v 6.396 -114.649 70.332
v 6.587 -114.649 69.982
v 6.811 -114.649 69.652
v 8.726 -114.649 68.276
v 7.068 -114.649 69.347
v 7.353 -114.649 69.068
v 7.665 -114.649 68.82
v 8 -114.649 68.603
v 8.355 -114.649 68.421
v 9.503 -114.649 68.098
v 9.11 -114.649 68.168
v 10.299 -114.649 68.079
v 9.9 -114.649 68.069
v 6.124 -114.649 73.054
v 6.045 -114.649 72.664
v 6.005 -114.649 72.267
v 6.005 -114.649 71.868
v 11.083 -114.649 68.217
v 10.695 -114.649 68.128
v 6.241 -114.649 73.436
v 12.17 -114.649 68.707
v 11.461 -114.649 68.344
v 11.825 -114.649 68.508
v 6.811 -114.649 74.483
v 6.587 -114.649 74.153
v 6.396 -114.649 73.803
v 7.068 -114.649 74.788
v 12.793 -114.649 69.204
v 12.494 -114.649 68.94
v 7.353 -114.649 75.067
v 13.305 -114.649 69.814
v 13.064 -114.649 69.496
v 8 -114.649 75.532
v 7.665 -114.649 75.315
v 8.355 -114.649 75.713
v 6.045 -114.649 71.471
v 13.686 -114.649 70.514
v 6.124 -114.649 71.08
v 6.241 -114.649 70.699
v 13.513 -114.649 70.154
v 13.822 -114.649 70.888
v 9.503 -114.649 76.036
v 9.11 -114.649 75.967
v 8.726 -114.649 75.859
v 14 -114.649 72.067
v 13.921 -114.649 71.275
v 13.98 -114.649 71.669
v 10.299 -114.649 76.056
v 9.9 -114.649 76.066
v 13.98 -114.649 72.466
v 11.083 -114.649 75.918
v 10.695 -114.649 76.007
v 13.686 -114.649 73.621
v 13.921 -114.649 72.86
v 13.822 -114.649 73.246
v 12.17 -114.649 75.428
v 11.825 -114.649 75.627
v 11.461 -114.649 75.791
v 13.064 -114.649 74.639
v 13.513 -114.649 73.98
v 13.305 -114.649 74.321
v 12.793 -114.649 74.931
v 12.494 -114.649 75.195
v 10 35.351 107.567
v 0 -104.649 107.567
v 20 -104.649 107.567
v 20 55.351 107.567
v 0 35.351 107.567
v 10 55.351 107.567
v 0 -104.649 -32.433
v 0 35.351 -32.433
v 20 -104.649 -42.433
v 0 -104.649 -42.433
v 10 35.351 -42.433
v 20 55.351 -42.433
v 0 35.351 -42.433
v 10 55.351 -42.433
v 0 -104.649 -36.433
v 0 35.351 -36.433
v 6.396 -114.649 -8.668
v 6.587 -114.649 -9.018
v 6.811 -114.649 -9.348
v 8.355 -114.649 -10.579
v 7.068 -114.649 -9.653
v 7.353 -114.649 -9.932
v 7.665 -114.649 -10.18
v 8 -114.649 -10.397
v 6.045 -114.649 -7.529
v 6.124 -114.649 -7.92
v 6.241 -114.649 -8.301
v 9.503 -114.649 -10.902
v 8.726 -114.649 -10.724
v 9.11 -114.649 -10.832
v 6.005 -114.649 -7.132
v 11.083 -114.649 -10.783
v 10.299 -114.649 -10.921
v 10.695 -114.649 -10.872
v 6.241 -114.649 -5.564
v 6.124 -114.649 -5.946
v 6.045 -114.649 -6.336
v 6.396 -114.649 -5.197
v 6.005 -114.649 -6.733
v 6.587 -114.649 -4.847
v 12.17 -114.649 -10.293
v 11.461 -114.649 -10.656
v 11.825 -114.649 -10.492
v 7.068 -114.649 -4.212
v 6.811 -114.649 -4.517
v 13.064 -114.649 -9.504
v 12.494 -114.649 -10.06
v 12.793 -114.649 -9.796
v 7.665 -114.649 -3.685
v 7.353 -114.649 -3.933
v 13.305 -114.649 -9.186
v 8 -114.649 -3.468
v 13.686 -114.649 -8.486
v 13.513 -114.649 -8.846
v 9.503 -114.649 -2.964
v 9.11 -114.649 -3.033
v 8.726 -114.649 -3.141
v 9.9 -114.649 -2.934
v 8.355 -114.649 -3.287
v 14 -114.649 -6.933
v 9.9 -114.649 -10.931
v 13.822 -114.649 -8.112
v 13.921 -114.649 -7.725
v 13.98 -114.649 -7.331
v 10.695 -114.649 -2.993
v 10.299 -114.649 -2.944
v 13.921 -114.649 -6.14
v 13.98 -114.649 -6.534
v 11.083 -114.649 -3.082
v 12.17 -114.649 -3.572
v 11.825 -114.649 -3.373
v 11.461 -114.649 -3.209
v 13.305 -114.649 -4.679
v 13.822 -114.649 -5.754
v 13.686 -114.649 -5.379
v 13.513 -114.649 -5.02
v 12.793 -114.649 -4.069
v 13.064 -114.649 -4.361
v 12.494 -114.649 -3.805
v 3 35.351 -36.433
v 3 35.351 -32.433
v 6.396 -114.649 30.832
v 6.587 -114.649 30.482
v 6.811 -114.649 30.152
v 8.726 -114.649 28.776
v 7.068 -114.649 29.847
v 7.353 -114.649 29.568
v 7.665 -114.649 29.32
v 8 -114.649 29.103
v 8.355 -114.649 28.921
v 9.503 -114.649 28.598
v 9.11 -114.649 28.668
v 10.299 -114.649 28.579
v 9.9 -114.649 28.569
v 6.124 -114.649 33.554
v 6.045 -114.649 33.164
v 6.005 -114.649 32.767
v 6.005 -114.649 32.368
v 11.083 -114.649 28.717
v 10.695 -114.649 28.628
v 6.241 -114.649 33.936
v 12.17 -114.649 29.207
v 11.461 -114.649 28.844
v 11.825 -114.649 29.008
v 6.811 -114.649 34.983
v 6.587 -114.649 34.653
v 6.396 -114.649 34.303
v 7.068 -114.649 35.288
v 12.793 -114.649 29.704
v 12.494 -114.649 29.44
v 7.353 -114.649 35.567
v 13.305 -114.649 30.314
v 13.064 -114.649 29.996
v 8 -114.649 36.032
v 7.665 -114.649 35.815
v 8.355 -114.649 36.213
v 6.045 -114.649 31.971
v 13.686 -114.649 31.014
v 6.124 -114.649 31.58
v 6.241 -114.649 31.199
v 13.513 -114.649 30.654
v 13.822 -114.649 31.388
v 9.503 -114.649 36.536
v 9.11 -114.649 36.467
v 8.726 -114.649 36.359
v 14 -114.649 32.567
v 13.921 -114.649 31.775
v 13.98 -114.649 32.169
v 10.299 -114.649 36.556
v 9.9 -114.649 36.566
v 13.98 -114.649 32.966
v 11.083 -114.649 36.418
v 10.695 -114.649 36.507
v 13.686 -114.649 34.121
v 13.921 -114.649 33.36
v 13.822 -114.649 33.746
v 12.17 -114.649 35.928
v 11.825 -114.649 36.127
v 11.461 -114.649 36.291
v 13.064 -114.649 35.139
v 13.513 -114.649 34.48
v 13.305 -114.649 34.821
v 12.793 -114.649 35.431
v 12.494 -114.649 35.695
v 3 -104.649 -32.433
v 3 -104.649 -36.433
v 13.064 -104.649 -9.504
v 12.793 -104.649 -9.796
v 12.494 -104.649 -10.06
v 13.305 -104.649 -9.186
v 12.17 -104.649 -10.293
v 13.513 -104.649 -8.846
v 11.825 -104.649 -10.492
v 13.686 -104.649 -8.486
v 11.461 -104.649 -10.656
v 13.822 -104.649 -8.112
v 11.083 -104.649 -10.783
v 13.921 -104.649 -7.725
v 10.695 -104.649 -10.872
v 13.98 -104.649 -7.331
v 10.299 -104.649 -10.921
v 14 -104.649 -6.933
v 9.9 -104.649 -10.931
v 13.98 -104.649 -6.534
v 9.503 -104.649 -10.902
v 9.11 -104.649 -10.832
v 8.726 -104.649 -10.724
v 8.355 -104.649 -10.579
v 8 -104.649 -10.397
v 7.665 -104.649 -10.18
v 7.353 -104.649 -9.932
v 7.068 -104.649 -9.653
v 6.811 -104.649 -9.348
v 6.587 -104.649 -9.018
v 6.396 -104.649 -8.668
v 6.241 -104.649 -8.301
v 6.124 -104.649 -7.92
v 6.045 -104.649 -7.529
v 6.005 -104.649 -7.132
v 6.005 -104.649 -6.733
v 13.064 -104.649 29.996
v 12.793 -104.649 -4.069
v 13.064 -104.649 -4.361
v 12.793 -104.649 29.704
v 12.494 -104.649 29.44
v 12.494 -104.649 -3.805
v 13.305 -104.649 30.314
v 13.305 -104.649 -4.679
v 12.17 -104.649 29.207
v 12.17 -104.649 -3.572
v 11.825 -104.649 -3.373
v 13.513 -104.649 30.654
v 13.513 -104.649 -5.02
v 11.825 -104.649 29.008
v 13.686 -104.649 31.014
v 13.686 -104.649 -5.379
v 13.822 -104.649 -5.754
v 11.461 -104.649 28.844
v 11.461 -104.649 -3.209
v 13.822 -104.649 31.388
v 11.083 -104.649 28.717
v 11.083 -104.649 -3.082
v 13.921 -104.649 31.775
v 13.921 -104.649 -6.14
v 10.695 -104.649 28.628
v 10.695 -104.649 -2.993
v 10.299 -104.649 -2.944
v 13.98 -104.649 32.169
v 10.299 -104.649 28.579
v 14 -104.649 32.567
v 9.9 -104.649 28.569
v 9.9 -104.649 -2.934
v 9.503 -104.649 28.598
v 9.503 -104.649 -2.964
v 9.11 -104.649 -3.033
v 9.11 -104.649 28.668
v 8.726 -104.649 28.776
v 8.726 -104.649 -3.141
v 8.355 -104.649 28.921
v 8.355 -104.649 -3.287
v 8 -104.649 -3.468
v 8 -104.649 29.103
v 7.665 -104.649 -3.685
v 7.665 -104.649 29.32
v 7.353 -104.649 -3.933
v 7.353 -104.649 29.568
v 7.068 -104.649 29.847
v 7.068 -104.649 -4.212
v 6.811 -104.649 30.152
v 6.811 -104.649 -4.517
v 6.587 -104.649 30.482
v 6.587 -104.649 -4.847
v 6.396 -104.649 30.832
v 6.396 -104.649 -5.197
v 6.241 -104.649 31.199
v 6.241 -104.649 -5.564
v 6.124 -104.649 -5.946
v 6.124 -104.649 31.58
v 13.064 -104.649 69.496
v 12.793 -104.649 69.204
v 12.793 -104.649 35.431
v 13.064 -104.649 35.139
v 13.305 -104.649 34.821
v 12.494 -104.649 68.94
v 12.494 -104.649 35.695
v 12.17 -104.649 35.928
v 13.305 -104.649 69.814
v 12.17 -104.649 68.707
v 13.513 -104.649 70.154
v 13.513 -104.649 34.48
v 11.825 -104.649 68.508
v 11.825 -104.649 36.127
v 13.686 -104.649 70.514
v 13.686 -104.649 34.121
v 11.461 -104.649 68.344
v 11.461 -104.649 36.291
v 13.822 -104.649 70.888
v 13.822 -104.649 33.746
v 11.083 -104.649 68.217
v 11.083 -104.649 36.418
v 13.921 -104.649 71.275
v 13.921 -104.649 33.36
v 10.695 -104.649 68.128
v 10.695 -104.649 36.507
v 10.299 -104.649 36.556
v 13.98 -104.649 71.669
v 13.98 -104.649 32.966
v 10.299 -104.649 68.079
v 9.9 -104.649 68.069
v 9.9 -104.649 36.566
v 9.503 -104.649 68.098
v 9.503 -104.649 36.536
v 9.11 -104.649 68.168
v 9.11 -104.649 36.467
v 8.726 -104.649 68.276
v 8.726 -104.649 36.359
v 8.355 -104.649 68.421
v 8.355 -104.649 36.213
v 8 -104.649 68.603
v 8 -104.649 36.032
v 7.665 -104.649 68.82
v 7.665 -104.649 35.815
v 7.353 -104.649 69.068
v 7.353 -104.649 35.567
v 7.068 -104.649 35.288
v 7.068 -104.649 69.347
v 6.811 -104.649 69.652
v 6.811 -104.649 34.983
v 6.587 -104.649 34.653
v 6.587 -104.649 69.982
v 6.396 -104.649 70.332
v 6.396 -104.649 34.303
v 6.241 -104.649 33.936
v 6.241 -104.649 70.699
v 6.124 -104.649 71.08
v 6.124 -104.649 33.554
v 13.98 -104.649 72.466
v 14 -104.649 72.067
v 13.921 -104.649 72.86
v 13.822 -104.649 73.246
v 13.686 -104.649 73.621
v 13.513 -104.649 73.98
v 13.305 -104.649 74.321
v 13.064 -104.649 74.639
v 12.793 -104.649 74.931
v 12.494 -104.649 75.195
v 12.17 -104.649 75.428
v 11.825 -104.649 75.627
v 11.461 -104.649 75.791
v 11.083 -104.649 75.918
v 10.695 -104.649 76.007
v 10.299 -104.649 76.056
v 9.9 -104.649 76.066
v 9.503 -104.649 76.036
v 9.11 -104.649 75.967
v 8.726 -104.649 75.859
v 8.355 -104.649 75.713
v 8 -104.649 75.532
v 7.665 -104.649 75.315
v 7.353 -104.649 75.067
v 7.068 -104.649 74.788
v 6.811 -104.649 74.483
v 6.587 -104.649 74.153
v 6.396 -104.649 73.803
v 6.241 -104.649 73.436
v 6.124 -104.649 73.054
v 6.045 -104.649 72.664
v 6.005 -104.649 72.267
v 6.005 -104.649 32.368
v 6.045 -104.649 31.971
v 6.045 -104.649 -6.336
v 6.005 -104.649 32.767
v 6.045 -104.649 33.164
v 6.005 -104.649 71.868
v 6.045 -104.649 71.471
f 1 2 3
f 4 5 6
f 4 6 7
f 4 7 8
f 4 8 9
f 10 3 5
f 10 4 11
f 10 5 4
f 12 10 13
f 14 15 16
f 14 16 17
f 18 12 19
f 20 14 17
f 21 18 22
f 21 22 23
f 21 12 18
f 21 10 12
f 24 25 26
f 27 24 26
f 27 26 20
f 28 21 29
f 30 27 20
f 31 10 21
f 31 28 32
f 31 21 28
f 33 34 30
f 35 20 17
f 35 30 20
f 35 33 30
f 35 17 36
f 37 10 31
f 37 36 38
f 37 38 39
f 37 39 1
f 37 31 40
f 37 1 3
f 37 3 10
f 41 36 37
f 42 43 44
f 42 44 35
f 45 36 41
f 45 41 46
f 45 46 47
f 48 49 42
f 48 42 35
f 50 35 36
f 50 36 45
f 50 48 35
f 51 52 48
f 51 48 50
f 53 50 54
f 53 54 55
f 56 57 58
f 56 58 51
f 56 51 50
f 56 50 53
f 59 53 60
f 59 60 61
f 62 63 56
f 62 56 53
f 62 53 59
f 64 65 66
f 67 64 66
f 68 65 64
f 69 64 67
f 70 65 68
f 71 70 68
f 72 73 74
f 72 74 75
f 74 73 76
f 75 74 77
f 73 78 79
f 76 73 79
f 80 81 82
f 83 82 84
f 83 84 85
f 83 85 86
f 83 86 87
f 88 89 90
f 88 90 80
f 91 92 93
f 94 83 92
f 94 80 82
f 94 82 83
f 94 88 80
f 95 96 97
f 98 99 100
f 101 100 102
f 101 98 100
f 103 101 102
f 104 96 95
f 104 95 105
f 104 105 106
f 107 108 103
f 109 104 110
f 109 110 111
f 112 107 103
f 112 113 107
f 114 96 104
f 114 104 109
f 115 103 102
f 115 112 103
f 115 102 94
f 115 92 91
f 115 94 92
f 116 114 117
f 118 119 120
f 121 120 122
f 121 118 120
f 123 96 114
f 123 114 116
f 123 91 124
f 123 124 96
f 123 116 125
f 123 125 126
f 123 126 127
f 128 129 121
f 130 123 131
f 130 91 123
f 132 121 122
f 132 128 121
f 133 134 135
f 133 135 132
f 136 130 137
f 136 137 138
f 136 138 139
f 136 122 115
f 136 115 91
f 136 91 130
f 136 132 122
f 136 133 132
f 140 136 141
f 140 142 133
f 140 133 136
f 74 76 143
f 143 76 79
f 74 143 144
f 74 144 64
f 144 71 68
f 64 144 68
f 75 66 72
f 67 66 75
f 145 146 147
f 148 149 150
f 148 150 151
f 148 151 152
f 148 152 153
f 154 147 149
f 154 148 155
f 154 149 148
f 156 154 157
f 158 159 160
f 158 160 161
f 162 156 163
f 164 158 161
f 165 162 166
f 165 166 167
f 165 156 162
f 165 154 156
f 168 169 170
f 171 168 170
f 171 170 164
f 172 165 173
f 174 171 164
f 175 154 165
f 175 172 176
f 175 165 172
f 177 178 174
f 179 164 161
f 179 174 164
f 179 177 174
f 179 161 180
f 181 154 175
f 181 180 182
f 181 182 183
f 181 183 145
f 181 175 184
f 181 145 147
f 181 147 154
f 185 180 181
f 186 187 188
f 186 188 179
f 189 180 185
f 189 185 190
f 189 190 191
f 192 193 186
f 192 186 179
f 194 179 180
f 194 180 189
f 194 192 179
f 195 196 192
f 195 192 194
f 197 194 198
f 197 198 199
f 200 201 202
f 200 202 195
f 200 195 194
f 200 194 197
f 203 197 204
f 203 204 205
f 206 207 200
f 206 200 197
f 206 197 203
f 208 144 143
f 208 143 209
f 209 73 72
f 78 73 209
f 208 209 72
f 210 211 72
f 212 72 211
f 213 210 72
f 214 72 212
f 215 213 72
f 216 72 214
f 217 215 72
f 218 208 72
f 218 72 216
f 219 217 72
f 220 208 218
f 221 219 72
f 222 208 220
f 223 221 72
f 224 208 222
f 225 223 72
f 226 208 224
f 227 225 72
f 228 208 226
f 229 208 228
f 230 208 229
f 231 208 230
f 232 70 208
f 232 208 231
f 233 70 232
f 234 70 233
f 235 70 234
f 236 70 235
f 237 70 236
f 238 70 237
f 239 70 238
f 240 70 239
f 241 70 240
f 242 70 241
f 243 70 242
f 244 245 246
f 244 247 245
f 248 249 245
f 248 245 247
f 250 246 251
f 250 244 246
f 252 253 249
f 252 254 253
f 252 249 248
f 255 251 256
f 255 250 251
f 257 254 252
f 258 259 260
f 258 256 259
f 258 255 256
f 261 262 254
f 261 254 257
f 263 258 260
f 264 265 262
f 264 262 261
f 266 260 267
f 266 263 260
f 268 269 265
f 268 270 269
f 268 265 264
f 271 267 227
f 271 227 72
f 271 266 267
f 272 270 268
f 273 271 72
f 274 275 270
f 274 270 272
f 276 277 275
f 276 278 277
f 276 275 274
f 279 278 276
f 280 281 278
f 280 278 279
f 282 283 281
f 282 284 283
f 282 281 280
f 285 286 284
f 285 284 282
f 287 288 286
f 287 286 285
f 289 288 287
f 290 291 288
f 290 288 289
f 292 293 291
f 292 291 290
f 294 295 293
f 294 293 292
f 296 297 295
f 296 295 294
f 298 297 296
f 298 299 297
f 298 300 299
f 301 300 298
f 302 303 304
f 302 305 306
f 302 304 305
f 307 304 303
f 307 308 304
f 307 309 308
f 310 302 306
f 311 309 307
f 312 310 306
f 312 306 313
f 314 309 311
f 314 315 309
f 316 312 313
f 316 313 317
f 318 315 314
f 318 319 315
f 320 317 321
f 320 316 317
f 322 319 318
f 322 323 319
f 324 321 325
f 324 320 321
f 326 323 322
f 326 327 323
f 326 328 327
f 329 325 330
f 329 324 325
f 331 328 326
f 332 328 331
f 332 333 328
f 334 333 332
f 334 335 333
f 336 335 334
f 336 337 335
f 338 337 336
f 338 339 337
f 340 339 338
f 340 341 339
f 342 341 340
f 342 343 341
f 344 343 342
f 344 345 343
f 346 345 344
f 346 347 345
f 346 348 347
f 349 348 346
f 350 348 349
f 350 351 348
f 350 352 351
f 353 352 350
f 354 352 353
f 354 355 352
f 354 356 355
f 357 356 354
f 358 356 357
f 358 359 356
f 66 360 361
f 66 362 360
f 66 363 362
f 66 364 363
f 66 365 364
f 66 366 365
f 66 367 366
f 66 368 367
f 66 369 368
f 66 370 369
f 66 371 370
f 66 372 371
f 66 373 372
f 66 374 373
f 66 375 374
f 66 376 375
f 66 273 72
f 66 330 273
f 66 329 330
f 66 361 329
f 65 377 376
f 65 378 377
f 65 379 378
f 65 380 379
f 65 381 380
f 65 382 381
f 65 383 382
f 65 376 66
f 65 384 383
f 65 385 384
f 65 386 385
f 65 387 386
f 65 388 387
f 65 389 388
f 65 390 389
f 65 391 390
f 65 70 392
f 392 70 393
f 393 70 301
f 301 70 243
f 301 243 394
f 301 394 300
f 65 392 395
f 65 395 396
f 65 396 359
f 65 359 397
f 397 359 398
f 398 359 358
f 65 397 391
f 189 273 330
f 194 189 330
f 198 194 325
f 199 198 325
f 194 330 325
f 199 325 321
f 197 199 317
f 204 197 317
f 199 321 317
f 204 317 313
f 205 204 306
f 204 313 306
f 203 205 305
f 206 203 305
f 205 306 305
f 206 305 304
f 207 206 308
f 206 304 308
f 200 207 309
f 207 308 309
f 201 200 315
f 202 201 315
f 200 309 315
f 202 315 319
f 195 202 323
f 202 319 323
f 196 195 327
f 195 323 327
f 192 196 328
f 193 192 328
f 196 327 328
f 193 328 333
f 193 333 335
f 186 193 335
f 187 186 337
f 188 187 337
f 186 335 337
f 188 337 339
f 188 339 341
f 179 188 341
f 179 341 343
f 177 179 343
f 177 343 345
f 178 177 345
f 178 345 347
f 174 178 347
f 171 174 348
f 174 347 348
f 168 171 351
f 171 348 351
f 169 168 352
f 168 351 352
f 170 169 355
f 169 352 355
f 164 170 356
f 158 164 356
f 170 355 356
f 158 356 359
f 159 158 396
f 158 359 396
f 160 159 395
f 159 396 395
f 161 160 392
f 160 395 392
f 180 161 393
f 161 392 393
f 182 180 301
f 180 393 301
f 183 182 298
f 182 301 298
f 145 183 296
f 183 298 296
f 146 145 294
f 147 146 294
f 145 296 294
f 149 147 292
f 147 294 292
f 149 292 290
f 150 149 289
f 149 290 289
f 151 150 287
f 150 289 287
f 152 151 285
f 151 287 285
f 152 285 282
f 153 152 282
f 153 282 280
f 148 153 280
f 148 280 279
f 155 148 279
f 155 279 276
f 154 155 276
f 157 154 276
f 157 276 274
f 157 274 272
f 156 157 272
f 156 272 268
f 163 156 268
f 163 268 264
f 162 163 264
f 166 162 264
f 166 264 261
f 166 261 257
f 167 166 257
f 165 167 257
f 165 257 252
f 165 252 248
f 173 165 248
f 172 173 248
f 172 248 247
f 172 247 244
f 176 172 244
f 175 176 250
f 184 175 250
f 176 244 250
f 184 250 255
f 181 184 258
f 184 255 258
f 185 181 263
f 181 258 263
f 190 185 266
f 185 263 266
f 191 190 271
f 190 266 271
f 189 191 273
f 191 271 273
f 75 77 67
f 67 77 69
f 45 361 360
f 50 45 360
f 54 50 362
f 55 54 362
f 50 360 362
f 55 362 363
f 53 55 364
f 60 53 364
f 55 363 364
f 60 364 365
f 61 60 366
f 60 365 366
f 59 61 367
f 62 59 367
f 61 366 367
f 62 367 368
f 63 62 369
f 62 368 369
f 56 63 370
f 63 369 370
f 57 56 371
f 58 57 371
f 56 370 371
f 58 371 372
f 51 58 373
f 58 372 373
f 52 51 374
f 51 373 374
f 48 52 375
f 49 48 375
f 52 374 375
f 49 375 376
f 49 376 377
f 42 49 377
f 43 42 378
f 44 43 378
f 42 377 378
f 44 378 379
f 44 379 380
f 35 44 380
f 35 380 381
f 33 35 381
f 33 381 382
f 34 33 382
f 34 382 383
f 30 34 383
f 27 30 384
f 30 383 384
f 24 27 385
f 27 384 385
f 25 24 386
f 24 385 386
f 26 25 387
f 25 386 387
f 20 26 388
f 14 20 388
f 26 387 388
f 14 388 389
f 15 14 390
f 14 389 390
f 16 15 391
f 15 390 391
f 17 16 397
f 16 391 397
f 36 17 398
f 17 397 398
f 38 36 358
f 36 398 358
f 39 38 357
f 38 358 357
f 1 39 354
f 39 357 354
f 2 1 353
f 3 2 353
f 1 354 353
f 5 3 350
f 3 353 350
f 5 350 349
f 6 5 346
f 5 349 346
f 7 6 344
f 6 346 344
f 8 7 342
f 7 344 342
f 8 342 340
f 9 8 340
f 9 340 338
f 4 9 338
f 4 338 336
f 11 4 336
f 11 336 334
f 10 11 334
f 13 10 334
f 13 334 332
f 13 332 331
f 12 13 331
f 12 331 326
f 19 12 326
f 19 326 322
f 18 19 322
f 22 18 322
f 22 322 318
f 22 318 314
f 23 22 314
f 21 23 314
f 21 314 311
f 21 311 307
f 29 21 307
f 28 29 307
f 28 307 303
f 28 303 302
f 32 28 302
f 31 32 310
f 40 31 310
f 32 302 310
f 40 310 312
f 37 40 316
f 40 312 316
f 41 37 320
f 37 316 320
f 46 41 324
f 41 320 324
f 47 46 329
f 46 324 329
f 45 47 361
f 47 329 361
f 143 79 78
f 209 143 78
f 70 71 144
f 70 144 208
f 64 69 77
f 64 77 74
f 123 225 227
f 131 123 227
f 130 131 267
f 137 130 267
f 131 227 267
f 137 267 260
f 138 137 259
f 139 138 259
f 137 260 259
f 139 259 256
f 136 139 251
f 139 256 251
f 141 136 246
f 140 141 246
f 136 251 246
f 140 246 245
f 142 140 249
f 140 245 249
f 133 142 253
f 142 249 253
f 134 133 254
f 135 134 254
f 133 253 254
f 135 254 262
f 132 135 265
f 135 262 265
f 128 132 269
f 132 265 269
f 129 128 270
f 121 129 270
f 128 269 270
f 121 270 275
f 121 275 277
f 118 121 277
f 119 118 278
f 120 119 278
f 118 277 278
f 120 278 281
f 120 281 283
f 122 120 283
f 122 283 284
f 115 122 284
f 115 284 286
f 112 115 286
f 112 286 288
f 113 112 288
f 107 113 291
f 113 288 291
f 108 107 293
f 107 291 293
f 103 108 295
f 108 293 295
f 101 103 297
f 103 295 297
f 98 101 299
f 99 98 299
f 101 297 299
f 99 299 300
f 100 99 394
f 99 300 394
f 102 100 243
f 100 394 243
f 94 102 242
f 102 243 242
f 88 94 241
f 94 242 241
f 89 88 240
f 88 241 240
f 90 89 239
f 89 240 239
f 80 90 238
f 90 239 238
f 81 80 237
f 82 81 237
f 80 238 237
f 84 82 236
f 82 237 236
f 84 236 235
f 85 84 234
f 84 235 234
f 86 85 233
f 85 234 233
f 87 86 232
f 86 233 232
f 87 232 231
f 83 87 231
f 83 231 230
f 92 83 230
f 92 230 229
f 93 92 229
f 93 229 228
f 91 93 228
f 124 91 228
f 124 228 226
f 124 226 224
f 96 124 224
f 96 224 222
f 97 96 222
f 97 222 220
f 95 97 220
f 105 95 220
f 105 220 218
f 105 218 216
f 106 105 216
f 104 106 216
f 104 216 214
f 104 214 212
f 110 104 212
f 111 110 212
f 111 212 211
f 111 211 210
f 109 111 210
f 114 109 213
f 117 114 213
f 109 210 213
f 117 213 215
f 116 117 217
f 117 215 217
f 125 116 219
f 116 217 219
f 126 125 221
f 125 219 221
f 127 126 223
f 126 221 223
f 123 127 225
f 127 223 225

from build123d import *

# Parameters (mm, degrees)
F0_W     = 160
F0_H     = 150
F1_DEPTH = 20
F2_W     = 20
F2_H     = 150
F3_DEPTH = 10
F5_W     = 140
F5_H     = 4
F6_DEPTH = 3
F4_R     = 4
F7_DEPTH = 10


with BuildPart() as f1:
    # F0 (on Right) → F1 (new body)
    with BuildSketch(Plane.YZ):
        with Locations((-24.649234, 32.567439)):
            Rectangle(F0_W, F0_H)
    extrude(amount=F1_DEPTH)

    # F2 (on face) → F3 (cut)
    with BuildSketch(Plane(origin=(0, 0, 0), x_dir=(0, -1, 0), z_dir=(-1, 0, 0))):
        with Locations((-45.350766, 32.567439)):
            Rectangle(F2_W, F2_H)
    extrude(amount=-F3_DEPTH, mode=Mode.SUBTRACT)

    # F5 (on face) → F6 (cut)
    with BuildSketch(Plane(origin=(0, 0, 0), x_dir=(0, -1, 0), z_dir=(-1, 0, 0))):
        with Locations((34.649234, -34.432561)):
            Rectangle(F5_W, F5_H)
    extrude(amount=-F6_DEPTH, mode=Mode.SUBTRACT)

    # F4 (on face) → F7 (join)
    with BuildSketch(Plane.XZ.offset(104.649234)):
        with Locations((10, 72.067439)):
            Circle(F4_R)
        with Locations((10, 32.567439)):
            Circle(F4_R)
        with Locations((10, -6.932561)):
            Circle(F4_R)
    extrude(amount=F7_DEPTH)


solid = f1.part
